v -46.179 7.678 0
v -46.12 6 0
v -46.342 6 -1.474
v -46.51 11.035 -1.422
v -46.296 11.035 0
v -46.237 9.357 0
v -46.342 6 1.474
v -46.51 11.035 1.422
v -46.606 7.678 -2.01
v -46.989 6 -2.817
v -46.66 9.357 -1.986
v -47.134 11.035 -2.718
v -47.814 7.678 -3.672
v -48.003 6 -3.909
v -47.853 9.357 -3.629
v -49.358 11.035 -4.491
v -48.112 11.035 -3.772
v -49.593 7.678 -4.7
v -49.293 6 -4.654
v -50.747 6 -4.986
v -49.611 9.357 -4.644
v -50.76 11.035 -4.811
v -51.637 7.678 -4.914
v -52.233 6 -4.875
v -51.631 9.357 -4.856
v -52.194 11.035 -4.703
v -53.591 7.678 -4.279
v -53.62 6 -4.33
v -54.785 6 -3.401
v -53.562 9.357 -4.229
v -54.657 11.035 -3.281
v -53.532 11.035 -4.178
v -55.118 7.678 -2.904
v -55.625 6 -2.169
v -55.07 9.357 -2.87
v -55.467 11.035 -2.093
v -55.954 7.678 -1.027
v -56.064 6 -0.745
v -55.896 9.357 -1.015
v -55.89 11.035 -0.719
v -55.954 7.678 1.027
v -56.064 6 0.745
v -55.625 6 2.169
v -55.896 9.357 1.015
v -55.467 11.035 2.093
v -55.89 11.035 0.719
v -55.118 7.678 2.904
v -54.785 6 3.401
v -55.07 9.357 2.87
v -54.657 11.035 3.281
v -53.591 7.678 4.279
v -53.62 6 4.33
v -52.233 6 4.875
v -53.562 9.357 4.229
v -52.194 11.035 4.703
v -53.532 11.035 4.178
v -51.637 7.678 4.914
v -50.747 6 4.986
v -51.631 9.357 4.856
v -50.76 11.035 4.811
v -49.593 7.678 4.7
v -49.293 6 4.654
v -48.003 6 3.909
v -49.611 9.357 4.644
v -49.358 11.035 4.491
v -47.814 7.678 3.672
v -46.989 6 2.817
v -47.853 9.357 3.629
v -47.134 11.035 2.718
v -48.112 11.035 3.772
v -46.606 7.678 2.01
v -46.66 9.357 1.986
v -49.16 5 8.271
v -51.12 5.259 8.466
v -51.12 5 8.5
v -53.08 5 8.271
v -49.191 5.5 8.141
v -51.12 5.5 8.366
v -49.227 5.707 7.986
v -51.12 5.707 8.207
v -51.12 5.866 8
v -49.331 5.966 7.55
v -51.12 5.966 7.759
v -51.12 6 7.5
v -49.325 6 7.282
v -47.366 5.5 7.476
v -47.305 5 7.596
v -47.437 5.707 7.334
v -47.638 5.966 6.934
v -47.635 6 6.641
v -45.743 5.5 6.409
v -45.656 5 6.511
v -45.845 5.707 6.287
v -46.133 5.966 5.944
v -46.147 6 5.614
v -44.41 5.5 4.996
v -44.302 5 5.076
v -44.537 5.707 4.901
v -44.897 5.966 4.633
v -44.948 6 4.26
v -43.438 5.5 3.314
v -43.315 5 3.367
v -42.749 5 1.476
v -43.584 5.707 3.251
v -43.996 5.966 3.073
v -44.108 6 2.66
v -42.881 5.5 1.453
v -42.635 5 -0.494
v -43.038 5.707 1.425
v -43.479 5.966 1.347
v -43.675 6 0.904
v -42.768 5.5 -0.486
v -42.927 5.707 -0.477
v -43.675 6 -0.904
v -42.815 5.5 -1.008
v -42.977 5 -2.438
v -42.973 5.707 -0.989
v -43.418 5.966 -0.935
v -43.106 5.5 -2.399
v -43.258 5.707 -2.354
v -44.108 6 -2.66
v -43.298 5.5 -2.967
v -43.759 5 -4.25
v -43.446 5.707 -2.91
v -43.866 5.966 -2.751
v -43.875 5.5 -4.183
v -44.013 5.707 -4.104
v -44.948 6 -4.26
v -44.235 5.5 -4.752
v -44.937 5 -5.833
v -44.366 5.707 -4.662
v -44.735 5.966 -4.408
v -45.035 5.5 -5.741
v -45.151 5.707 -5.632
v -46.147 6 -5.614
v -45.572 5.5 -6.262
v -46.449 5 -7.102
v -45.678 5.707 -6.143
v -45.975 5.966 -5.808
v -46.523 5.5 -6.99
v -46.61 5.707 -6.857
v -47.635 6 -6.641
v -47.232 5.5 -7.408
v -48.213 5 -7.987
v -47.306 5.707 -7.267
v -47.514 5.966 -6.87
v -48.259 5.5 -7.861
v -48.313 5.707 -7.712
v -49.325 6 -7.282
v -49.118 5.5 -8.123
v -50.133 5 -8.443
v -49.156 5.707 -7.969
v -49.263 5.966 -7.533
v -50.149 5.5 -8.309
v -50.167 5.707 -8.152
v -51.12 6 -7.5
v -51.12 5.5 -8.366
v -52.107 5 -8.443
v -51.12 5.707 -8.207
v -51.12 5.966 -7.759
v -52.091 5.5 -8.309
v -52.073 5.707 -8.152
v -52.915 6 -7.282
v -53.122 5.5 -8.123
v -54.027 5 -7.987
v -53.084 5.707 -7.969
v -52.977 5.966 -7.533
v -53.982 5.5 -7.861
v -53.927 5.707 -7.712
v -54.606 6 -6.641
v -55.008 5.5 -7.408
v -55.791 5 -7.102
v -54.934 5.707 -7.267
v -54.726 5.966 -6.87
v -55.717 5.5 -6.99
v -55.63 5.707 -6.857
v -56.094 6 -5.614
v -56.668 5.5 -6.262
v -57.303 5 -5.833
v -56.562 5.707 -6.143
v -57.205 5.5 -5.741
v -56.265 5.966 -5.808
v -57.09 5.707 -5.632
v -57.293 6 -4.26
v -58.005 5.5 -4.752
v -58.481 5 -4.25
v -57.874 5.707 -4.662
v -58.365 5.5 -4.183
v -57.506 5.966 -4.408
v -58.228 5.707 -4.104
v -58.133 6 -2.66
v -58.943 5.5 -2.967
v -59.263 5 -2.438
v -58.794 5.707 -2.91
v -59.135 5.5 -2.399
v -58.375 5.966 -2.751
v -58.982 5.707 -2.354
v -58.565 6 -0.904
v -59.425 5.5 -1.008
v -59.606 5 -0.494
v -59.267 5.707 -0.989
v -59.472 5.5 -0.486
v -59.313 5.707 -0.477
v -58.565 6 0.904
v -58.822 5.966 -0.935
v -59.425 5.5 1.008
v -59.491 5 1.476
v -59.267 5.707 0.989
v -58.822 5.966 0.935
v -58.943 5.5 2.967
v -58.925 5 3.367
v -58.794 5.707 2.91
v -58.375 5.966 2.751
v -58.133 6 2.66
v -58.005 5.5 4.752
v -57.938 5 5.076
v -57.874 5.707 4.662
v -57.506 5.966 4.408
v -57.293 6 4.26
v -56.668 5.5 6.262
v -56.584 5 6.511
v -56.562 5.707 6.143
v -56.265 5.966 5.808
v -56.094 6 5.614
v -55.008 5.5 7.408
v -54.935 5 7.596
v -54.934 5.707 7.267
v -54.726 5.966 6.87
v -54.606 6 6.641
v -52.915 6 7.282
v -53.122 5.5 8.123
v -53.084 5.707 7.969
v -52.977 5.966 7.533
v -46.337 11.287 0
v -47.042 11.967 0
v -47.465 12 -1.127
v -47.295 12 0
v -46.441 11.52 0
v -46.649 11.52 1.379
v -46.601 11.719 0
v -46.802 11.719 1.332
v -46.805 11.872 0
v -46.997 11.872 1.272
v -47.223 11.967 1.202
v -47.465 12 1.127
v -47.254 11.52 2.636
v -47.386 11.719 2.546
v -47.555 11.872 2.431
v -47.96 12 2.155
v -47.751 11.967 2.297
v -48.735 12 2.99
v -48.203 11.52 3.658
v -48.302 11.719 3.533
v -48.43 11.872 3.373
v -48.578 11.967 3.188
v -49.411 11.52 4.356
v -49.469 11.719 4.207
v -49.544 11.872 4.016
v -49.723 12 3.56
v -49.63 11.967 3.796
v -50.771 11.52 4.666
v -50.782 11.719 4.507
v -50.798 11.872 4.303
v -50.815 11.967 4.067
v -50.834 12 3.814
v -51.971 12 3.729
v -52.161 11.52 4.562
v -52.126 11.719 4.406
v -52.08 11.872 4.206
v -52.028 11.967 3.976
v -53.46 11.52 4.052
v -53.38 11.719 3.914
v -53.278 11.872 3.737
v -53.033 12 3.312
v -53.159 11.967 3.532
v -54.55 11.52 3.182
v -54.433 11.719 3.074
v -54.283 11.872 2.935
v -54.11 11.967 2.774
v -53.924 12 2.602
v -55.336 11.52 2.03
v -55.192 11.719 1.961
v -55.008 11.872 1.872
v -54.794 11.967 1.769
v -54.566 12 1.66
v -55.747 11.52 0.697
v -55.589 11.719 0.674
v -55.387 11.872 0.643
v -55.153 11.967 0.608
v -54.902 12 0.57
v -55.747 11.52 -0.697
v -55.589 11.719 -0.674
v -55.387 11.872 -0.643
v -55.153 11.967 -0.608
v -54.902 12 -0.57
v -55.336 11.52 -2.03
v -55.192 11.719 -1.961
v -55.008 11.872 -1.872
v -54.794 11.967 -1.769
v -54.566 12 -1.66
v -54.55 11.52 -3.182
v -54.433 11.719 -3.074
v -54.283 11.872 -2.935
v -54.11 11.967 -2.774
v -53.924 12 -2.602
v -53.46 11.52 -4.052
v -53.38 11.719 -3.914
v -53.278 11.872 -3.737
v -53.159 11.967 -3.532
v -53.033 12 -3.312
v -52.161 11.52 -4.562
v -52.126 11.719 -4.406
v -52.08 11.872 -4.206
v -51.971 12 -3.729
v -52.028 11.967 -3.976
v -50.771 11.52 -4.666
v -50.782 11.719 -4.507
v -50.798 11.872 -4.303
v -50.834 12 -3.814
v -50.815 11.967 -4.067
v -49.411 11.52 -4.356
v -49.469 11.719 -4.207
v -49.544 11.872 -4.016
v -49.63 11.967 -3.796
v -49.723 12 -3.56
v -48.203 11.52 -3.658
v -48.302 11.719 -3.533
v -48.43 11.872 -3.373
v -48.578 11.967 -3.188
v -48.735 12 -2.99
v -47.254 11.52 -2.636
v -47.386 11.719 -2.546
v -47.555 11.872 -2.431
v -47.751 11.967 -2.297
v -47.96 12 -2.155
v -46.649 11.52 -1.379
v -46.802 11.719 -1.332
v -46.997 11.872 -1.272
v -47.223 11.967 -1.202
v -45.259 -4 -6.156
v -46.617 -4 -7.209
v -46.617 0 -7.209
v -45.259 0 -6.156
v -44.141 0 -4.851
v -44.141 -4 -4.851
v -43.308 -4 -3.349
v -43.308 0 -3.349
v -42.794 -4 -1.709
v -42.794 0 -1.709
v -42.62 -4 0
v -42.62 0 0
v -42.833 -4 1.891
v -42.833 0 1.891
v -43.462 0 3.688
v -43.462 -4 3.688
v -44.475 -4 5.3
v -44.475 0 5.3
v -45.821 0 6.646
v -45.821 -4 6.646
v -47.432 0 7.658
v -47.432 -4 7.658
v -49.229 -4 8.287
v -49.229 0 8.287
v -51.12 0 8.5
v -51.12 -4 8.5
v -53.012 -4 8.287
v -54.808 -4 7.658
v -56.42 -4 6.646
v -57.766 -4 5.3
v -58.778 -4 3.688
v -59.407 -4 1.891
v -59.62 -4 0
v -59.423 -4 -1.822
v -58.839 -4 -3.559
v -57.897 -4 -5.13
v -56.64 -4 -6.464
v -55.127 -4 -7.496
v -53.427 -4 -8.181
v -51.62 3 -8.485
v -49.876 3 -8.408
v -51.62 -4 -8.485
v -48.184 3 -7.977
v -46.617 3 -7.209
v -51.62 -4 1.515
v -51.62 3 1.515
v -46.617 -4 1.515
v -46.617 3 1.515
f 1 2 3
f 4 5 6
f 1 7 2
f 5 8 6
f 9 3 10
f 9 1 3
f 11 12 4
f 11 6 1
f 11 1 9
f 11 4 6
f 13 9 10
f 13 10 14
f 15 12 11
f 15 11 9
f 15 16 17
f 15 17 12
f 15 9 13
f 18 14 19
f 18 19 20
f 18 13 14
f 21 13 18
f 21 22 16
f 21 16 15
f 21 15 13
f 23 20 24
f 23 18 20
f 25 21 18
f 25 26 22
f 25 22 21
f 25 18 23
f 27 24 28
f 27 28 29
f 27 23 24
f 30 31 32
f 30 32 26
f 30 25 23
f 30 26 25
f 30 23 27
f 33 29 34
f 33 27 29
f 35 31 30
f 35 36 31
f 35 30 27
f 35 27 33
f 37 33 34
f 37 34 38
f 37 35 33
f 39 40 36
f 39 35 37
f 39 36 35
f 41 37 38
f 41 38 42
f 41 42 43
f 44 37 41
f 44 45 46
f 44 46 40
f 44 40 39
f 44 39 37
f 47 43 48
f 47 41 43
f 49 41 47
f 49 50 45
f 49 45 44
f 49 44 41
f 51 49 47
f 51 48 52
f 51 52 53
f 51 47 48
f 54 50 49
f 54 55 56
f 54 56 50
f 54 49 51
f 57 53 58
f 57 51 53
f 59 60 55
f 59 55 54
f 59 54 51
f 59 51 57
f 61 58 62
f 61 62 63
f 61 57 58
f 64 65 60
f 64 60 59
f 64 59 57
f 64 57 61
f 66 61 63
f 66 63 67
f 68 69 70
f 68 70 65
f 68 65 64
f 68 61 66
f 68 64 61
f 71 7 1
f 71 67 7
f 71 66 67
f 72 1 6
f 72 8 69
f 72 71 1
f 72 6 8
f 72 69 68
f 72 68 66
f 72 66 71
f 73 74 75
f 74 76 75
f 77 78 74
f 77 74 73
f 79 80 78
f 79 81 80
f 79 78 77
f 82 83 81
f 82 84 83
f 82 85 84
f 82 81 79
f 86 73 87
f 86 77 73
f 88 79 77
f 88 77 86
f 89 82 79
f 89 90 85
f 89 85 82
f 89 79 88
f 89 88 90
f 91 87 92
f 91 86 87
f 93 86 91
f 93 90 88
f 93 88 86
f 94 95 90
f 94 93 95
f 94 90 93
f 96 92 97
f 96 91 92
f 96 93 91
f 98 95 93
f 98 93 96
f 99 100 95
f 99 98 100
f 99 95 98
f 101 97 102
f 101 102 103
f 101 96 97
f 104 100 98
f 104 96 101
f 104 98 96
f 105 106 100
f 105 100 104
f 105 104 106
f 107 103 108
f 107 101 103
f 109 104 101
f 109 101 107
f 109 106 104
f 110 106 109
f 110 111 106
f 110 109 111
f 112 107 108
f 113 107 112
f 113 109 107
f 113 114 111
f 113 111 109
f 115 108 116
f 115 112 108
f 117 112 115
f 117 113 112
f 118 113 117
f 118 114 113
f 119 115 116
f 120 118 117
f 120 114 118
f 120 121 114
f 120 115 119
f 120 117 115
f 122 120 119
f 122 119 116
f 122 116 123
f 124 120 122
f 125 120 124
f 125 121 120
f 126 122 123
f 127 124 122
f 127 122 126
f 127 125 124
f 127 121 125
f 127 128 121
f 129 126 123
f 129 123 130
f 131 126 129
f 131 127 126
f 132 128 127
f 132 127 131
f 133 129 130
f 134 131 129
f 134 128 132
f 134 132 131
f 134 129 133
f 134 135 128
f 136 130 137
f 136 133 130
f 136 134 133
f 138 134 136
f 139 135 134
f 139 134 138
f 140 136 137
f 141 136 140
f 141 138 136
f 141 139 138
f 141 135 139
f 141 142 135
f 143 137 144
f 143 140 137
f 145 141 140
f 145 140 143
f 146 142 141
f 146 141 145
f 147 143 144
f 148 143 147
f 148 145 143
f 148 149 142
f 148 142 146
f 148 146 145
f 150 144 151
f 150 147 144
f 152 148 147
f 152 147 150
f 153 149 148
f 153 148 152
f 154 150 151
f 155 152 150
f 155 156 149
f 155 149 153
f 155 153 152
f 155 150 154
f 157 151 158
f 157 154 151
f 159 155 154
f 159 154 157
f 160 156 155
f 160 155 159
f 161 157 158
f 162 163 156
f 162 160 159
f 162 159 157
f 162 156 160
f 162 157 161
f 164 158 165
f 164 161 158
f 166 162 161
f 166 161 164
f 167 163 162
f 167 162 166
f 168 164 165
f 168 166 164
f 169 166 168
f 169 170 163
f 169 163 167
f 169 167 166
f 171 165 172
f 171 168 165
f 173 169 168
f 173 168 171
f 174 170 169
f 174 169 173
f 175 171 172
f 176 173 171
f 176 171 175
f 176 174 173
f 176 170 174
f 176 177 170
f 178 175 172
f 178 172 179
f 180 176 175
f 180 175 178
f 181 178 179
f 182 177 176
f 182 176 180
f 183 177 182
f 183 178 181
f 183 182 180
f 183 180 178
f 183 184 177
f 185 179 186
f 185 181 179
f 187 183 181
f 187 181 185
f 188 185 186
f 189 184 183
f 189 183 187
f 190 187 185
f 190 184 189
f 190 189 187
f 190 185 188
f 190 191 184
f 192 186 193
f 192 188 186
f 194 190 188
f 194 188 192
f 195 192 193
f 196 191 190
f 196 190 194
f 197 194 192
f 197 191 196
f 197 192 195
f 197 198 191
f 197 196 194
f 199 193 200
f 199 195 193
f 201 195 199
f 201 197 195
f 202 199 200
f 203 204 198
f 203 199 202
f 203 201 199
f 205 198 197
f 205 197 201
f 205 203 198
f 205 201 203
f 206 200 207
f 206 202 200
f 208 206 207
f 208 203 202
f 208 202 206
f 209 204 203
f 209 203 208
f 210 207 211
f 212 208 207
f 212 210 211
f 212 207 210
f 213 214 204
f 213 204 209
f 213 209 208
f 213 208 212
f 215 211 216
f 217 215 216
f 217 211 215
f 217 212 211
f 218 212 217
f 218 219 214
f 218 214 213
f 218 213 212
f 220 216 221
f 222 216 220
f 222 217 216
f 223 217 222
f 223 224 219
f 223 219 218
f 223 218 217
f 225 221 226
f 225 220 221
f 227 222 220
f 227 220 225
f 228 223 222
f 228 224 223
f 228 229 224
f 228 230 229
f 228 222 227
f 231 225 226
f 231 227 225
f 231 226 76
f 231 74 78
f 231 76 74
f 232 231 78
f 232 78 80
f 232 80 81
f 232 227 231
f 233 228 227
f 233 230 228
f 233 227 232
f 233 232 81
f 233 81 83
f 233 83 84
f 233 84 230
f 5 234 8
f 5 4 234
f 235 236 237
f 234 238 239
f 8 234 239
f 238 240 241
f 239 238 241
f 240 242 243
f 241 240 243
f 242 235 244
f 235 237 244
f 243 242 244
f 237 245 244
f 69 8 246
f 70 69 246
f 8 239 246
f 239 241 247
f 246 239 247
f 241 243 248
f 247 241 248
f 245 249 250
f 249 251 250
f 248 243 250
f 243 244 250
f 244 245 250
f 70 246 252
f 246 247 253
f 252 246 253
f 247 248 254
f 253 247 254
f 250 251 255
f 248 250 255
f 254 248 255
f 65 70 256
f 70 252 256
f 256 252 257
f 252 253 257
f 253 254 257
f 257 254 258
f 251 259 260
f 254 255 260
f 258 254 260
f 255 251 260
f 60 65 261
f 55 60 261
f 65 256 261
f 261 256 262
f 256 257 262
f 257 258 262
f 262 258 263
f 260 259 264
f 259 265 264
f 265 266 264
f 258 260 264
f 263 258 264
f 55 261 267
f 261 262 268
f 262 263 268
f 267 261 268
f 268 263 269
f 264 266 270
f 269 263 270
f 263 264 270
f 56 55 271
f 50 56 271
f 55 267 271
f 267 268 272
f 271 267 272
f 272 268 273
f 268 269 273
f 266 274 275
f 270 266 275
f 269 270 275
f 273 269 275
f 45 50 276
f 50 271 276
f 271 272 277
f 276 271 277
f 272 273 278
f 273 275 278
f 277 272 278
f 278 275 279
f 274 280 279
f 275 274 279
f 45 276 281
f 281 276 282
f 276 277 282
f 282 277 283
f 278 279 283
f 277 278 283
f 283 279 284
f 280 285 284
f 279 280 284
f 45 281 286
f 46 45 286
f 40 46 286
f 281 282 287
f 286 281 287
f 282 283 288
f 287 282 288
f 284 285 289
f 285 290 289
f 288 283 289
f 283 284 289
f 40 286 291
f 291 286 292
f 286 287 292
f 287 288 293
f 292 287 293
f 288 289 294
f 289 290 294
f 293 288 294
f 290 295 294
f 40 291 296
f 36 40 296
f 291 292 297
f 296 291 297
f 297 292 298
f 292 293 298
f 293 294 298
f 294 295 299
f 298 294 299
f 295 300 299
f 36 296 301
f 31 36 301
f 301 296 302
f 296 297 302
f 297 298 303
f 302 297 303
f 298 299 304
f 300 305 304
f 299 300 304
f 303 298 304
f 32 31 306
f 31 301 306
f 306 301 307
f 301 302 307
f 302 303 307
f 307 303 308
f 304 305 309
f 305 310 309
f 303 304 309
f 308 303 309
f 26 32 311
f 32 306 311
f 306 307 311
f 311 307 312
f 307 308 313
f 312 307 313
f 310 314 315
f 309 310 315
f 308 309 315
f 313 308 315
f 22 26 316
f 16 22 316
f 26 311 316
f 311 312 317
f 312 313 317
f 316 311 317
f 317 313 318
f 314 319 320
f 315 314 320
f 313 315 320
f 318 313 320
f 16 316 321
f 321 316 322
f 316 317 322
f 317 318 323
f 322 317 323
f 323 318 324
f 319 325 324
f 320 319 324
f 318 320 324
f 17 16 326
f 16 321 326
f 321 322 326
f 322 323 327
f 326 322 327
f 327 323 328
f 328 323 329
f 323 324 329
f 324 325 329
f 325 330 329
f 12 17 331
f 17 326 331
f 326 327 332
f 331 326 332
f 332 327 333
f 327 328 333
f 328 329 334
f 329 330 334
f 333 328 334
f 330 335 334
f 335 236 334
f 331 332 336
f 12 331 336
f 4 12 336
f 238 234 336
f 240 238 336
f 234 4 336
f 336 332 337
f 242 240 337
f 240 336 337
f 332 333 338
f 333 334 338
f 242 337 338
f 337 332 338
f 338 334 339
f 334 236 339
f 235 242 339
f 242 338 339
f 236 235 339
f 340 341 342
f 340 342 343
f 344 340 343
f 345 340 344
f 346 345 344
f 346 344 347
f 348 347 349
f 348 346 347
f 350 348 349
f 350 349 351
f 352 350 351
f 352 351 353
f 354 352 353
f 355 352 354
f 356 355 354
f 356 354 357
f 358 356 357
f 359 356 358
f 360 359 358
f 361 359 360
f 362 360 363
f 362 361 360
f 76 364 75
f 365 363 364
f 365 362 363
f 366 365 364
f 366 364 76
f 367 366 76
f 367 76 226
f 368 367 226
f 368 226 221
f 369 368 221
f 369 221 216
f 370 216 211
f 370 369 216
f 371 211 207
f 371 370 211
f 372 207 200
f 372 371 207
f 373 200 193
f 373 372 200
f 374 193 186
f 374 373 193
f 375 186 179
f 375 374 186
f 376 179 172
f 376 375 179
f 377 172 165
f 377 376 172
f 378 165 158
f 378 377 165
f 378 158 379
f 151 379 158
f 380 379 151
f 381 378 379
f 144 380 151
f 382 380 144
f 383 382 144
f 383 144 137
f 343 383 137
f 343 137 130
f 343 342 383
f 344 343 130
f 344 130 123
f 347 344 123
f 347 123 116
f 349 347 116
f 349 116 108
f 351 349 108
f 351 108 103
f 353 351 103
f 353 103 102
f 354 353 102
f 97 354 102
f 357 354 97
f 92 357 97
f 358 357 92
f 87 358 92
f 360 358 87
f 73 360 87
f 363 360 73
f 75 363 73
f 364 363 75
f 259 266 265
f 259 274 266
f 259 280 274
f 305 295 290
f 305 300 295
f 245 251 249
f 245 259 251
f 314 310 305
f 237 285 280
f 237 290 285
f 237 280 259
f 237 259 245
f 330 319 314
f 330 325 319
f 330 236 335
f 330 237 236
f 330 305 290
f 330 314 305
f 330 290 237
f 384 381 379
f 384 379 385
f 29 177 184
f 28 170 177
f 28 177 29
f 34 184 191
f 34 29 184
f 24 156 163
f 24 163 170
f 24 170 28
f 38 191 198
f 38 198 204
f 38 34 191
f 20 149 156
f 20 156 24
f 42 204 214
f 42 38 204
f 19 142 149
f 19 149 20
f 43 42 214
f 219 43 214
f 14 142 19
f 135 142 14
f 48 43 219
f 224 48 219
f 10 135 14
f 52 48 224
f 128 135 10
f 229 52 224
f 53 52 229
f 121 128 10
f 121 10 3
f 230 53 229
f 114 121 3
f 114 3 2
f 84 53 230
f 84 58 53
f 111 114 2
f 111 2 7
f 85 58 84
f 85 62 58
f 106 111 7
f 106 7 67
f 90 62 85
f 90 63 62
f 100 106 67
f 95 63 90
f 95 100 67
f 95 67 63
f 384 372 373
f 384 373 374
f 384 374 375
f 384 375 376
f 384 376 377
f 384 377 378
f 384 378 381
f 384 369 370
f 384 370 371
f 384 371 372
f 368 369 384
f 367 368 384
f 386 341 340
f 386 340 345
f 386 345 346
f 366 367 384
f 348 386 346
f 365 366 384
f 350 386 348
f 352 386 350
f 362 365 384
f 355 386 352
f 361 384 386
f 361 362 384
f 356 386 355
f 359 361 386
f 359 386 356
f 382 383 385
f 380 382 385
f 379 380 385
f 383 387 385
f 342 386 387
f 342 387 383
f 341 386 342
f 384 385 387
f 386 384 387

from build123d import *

# Parameters (mm, degrees)
SKETCH1_R           = 8.5
BOSS_EXTRUDE1_DEPTH = 6
FILLET2_R           = 1
SKETCH2_R           = 5
BOSS_EXTRUDE3_DEPTH = 6
BOSS_EXTRUDE3_TAPER = 2
FILLET4_R           = 1
BOSS_EXTRUDE4_START = 4
BOSS_EXTRUDE4_DEPTH = 4
CUT_EXTRUDE4_DEPTH  = 7


with BuildPart() as part:
    # Sketch1 → Boss-Extrude1 (new body)
    with BuildSketch(Plane(origin=(0, 0, 0), x_dir=(1, 0, 0), z_dir=(0, 1, 0))):
        with Locations(Location((-51.120170416, 0, 0), (0, 0, 270))):
            Circle(SKETCH1_R)
    extrude(amount=BOSS_EXTRUDE1_DEPTH)

    # Fillet2
    fillet2_edges = [part.edges().sort_by_distance(p)[0] for p in [
        (-51.120170416, 6, -8.5),
    ]]
    fillet(fillet2_edges, radius=FILLET2_R)

    # Sketch2 → Boss-Extrude3 (add)
    with BuildSketch(Plane(origin=(0, 6, 0), x_dir=(1, 0, 0), z_dir=(0, 1, 0))):
        with Locations((-51.120170416, 0)):
            Circle(SKETCH2_R)
    extrude(amount=BOSS_EXTRUDE3_DEPTH, taper=BOSS_EXTRUDE3_TAPER)

    # Fillet4
    fillet4_edges = [part.edges().sort_by_distance(p)[0] for p in [
        (-55.9106458, 12, 0),
    ]]
    fillet(fillet4_edges, radius=FILLET4_R)

    # Sketch3 → Boss-Extrude4 (add)
    with BuildSketch(Plane.XZ.offset(BOSS_EXTRUDE4_START)):
        with BuildLine():
            Line((-51.620170416, 0), (-59.620170416, 0))
            ThreePointArc((-59.620170416, 0), (-57.304828855, -5.830951895), (-51.620170416, -8.485281374))
            Line((-51.620170416, -8.485281374), (-51.620170416, 0))
        make_face()
        with BuildLine():
            ThreePointArc((-42.620170416, 0), (-51.120170416, 8.5), (-59.620170416, 0))
            Line((-59.620170416, 0), (-51.620170416, 0))
            Line((-51.620170416, 0), (-51.620170416, 1.514718626))
            Line((-51.620170416, 1.514718626), (-46.616547928, 1.514718626))
            Line((-46.616547928, 1.514718626), (-46.616547928, 0))
            Line((-46.616547928, 0), (-42.620170416, 0))
        make_face()
        with BuildLine():
            ThreePointArc((-46.616547928, -7.208840717), (-43.686100497, -4.121238215), (-42.620170416, 0))
            Line((-42.620170416, 0), (-46.616547928, 0))
            Line((-46.616547928, 0), (-46.616547928, -7.208840717))
        make_face()
    extrude(amount=-BOSS_EXTRUDE4_DEPTH)

    # Sketch6 → Cut-Extrude4 (cut)
    with BuildSketch(Plane.XZ.offset(4)):
        with BuildLine():
            ThreePointArc((-46.616547928, -7.208840717), (-49.019081783, -8.236226475), (-51.620170416, -8.485281374))
            Line((-51.620170416, -8.485281374), (-51.620170416, 1.514718626))
            Line((-51.620170416, 1.514718626), (-46.616547928, 1.514718626))
            Line((-46.616547928, 1.514718626), (-46.616547928, -7.208840717))
        make_face()
    extrude(amount=-CUT_EXTRUDE4_DEPTH, mode=Mode.SUBTRACT)


solid = part.part
